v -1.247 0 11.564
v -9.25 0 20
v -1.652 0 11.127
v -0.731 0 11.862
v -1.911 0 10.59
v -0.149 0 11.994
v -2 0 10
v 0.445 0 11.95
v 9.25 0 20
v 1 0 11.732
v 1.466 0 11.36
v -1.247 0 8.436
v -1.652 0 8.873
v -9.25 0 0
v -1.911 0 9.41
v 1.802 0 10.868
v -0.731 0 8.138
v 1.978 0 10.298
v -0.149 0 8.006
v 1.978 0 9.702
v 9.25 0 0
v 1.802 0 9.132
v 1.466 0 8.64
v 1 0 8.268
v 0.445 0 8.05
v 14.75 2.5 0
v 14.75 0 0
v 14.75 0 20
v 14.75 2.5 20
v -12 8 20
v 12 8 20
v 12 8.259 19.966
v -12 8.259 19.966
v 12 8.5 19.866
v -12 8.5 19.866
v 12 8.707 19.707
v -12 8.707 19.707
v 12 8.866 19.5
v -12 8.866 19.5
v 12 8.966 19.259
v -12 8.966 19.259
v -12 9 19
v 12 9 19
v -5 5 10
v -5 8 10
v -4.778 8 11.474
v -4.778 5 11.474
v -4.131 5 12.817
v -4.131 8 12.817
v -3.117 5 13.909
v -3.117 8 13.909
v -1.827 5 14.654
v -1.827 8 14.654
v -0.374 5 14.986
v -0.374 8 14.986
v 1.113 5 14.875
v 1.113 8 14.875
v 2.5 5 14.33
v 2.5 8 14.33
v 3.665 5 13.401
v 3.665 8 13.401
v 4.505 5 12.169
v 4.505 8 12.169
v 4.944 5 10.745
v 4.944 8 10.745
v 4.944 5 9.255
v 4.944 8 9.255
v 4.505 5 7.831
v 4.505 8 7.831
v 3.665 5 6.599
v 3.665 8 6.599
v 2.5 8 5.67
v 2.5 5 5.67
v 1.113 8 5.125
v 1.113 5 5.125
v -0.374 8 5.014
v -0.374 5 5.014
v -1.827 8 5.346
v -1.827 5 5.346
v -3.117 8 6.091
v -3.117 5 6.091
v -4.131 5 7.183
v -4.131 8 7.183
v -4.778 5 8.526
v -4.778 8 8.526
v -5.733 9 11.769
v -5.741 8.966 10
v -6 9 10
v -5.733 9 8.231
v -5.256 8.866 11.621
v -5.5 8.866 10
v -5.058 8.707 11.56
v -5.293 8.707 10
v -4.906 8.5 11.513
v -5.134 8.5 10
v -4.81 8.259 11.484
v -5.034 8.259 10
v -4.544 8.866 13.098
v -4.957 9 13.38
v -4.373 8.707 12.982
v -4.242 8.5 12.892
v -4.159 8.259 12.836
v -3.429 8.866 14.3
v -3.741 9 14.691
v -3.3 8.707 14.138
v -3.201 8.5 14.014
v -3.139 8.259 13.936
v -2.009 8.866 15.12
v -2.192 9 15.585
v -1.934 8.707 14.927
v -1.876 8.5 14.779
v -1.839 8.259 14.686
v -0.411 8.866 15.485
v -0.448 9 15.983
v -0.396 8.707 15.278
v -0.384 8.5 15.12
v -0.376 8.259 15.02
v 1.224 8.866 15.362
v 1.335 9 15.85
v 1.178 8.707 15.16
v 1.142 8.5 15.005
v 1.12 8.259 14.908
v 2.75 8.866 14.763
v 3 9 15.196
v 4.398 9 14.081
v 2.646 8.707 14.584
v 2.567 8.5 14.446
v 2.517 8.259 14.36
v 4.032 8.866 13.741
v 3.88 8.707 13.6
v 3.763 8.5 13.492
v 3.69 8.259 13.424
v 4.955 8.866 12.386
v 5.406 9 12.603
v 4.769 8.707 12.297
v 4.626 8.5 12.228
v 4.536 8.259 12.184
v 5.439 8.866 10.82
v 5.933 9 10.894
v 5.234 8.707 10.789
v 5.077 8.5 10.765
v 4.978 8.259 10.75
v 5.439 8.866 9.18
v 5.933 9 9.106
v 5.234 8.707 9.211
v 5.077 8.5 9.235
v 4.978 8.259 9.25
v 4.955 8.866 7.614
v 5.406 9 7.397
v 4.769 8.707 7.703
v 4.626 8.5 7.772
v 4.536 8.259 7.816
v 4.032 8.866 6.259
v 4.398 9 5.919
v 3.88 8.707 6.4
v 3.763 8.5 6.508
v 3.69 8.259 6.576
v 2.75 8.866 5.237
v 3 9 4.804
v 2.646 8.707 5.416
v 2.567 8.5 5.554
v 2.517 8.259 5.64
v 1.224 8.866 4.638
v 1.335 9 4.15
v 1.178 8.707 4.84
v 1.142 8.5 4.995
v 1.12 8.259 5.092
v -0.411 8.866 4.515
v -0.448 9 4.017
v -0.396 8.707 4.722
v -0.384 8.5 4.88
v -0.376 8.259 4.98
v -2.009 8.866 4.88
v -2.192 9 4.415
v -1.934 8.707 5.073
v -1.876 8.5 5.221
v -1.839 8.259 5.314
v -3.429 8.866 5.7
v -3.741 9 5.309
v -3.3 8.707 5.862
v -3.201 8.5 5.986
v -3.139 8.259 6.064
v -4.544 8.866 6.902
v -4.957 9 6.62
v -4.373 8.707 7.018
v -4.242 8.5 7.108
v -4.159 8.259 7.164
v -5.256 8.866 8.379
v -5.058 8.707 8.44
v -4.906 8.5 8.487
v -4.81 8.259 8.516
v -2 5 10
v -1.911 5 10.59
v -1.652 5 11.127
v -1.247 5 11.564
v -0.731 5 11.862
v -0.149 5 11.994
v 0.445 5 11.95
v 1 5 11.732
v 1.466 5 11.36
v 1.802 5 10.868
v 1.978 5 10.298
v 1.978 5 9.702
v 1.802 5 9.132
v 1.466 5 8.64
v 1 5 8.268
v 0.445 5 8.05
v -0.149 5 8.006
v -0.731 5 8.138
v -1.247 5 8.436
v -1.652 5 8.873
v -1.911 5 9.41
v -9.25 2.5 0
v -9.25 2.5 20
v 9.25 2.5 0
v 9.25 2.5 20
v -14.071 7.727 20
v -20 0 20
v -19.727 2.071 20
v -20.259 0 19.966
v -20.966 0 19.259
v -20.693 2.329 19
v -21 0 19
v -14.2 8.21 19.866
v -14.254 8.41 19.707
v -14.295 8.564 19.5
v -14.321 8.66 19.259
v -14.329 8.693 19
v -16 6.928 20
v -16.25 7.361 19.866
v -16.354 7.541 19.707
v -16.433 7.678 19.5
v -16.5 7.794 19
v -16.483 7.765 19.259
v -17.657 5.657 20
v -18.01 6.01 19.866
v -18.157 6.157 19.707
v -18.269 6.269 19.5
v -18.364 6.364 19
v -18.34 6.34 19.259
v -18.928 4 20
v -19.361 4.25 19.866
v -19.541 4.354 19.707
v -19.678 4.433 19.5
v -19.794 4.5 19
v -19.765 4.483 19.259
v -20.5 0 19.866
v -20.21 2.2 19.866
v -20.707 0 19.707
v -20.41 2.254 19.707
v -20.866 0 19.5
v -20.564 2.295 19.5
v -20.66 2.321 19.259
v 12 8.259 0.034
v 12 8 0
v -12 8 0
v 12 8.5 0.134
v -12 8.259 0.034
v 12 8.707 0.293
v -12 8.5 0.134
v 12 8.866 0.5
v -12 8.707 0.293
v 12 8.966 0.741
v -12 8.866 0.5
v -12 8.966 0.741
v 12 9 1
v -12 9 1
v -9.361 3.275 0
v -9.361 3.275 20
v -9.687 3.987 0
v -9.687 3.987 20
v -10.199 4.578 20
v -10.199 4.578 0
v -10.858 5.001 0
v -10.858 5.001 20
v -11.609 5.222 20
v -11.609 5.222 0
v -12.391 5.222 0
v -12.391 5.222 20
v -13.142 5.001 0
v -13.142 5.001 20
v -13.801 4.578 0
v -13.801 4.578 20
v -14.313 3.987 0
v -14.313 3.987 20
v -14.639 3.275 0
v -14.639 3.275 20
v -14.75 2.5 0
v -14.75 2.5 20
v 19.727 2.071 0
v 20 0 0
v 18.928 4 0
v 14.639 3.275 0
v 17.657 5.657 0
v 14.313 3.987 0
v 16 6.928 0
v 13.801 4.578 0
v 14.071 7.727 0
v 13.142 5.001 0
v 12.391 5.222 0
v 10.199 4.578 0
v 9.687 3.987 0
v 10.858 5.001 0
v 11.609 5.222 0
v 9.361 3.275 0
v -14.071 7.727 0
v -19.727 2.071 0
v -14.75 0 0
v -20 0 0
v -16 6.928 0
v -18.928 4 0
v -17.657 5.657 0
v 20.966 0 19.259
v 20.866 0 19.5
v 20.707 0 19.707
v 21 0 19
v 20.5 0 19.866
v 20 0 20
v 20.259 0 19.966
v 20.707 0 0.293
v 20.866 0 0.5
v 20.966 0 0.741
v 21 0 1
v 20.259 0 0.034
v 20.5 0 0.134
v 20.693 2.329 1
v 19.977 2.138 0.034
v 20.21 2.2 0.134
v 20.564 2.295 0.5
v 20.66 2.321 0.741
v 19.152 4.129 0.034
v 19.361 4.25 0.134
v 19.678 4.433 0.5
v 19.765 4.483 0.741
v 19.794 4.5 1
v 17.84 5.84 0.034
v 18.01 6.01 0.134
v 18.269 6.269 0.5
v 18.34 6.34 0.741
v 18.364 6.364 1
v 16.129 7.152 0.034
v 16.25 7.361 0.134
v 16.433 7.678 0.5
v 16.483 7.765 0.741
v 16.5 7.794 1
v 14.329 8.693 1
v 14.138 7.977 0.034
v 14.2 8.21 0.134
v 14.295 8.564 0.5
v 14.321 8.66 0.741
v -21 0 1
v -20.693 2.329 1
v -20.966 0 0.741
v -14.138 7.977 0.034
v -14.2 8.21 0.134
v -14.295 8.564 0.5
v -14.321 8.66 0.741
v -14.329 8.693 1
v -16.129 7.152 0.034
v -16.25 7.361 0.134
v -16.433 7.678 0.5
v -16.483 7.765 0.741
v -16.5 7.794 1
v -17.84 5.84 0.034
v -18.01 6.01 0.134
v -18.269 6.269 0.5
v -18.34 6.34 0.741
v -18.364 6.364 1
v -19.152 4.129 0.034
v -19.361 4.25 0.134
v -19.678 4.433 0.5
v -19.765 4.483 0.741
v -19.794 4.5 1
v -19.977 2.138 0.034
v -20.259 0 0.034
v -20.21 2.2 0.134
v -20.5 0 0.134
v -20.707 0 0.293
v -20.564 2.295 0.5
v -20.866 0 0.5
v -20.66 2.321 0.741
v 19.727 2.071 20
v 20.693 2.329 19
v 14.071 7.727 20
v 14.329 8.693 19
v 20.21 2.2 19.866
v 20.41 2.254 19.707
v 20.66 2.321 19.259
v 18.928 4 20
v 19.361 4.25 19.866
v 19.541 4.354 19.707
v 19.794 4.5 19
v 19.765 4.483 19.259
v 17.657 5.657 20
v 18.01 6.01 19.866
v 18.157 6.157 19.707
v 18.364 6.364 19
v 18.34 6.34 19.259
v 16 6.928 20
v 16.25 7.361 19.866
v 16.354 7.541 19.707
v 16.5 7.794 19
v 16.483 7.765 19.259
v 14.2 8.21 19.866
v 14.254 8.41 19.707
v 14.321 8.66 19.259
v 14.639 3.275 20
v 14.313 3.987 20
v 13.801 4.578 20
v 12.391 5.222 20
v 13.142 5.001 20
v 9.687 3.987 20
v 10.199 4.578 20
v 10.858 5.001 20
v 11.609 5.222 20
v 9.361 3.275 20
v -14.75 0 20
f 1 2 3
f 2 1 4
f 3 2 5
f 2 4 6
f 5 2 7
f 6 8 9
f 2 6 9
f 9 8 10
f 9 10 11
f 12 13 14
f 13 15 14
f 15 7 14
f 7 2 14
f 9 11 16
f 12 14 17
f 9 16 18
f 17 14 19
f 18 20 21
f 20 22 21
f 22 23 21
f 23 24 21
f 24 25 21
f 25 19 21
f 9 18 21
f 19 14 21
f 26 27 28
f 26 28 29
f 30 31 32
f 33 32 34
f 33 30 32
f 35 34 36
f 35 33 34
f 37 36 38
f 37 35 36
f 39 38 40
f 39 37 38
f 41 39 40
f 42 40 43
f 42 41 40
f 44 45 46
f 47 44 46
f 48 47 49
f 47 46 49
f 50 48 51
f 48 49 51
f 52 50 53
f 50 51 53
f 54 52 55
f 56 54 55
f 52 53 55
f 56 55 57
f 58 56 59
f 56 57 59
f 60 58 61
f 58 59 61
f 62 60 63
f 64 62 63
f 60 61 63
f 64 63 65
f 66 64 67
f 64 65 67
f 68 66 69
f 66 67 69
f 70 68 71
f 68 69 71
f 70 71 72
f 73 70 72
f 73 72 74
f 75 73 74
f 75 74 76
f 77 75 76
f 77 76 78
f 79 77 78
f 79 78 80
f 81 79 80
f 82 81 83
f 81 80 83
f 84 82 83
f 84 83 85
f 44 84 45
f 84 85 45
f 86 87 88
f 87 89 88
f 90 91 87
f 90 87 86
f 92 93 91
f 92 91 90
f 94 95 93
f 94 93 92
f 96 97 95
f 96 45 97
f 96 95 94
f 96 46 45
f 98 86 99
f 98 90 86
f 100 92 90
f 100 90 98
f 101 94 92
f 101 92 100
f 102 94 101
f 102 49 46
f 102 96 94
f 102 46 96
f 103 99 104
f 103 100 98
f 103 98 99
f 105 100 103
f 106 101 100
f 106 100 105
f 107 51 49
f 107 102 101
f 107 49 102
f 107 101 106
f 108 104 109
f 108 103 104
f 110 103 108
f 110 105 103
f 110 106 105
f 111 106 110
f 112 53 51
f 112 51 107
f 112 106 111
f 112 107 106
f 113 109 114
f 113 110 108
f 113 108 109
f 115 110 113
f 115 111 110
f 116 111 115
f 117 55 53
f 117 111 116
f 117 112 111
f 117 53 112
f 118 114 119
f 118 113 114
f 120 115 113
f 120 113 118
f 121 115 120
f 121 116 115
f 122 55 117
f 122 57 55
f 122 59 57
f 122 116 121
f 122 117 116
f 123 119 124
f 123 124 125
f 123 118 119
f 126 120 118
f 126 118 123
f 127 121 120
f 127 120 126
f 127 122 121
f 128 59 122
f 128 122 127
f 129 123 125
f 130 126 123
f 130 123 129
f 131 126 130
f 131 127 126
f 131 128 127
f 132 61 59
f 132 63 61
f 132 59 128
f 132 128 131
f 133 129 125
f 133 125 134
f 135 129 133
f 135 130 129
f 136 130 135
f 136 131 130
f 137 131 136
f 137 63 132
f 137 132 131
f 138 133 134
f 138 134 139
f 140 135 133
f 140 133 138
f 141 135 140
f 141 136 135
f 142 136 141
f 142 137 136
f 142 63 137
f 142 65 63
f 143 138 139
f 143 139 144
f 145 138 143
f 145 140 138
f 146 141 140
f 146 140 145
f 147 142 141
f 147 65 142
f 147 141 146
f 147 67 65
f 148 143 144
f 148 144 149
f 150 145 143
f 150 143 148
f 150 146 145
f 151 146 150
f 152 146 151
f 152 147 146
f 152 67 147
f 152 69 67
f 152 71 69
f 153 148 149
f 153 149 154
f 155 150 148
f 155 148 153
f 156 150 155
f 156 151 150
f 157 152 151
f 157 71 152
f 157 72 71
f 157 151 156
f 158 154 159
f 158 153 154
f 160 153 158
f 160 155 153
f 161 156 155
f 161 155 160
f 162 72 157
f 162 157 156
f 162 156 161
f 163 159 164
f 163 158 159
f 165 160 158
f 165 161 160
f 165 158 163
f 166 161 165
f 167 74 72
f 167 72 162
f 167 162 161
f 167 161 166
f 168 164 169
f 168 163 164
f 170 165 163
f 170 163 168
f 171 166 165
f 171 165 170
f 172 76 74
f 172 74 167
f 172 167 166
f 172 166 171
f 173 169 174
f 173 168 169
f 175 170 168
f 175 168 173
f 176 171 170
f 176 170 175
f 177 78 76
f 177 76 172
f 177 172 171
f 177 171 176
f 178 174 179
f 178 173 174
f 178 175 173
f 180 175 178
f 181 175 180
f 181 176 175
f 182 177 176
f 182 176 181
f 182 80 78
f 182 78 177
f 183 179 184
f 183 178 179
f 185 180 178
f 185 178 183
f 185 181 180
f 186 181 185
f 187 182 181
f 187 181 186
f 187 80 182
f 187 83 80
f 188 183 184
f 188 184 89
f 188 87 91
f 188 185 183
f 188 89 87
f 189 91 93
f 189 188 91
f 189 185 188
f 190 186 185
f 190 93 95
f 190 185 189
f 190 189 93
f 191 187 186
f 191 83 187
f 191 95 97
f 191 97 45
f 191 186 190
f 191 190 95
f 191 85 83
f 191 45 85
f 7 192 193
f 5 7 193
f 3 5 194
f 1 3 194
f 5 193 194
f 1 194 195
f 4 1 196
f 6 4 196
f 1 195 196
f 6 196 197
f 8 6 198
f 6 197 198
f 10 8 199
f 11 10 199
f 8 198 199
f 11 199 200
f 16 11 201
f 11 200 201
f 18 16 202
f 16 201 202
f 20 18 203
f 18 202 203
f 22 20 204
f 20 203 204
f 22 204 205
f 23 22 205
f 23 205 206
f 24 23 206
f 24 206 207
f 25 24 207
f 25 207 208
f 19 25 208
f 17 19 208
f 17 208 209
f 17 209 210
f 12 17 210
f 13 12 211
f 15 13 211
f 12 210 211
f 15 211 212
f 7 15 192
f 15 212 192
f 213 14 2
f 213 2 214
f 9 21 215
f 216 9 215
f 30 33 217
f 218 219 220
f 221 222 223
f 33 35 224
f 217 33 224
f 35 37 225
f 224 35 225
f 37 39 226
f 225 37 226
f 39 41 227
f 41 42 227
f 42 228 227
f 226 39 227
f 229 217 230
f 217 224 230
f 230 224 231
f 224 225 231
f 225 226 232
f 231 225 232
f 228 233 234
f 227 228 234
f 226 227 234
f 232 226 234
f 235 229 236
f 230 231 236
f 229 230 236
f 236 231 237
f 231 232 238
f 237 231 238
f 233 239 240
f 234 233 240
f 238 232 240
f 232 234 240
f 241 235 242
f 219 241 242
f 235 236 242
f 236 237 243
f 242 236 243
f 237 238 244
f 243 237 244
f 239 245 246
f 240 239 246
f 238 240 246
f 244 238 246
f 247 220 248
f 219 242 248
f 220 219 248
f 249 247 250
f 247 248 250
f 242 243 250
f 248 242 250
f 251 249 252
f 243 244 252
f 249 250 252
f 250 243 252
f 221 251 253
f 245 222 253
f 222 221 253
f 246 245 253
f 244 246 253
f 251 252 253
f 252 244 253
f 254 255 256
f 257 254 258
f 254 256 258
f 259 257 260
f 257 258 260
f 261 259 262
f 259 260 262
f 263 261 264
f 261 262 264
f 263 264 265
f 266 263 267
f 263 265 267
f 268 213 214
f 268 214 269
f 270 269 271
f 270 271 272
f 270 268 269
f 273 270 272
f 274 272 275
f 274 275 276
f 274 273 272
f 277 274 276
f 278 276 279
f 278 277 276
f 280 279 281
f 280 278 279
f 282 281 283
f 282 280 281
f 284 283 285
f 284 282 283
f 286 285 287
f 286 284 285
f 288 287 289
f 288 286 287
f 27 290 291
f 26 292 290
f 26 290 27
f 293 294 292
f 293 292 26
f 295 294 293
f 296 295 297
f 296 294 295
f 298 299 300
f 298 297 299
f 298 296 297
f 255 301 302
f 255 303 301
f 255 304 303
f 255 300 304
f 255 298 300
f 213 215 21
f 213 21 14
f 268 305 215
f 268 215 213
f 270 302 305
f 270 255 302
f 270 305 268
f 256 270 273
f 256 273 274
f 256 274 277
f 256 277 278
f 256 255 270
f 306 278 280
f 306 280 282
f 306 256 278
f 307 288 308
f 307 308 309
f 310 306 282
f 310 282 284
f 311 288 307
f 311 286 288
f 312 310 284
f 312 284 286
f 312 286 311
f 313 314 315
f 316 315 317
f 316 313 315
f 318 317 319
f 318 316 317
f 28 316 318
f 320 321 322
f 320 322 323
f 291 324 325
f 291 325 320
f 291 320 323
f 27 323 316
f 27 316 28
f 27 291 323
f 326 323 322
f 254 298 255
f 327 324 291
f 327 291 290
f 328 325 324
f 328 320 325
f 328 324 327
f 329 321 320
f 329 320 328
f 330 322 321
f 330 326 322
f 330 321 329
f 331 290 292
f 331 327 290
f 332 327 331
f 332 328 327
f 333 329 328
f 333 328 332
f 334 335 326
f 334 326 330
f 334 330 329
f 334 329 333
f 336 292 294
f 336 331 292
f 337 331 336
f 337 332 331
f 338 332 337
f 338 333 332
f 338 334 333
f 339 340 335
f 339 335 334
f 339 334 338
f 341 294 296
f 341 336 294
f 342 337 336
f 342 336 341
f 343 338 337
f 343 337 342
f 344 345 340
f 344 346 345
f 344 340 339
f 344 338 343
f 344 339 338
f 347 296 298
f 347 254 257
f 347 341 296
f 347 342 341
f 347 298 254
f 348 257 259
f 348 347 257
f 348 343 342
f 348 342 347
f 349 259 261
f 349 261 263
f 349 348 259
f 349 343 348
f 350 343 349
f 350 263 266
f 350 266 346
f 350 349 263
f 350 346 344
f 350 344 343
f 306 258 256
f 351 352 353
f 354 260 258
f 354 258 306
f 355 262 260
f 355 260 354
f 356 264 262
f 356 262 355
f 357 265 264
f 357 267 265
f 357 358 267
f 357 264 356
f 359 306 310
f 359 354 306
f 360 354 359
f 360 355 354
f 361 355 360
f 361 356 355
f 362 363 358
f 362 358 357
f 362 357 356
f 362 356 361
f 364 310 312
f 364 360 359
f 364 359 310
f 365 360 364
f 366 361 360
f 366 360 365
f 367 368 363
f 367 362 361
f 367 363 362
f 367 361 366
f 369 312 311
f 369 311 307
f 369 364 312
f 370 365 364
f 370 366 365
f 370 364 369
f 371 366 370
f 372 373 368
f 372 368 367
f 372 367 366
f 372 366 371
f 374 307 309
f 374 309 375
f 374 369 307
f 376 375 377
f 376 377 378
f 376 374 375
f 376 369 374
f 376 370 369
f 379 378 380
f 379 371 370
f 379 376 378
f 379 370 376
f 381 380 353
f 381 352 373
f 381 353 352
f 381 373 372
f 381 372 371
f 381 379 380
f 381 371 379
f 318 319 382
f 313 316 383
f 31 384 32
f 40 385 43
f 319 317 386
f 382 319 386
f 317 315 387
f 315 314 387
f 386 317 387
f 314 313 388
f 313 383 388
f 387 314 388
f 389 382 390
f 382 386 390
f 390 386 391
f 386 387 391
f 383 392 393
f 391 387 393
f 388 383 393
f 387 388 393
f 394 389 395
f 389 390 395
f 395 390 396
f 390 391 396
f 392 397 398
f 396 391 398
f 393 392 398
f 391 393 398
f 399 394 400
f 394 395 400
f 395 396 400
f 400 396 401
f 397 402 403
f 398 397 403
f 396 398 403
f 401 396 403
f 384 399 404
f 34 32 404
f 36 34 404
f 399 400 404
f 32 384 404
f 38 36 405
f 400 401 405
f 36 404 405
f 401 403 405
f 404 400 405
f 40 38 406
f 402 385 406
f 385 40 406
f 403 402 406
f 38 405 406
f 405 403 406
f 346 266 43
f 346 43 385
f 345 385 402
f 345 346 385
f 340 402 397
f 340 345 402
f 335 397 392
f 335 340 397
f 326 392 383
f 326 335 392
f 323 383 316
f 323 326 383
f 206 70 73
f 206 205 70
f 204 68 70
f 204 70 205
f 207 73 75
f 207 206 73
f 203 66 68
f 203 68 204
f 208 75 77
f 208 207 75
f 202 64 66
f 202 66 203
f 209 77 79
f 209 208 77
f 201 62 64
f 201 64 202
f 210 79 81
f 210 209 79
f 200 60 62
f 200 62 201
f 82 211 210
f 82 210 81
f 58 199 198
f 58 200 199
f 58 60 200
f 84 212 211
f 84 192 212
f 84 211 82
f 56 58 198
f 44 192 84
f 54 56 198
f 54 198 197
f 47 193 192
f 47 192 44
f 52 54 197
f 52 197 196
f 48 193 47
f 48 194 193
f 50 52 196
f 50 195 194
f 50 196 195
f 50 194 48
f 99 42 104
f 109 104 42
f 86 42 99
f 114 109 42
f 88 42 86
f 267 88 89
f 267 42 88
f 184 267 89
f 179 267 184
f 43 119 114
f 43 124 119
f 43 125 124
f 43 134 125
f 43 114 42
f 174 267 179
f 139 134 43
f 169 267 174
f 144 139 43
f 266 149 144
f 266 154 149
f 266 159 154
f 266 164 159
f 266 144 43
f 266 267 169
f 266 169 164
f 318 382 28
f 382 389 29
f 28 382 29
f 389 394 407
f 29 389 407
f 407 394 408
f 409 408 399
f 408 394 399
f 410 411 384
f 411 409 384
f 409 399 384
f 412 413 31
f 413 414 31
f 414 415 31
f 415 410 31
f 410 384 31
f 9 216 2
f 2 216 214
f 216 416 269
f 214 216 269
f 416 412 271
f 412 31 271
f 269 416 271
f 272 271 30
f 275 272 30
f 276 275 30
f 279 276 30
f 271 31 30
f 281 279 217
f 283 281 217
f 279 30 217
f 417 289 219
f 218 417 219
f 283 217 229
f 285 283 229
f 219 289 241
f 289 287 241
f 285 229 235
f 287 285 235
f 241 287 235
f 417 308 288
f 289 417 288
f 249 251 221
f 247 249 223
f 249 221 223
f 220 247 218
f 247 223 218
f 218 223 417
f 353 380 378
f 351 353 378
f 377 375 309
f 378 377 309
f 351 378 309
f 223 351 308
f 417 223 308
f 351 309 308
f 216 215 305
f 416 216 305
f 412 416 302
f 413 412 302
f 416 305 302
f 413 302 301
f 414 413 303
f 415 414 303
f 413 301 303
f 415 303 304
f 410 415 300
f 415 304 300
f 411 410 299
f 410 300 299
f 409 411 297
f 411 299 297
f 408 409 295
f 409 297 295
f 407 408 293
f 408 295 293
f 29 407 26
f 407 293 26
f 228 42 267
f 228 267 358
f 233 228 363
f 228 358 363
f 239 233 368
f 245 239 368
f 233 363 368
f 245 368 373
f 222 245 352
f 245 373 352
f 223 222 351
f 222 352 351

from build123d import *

# Parameters (mm, degrees)
PAD_DEPTH       = 20
SKETCH001_R     = 5
POCKET_DEPTH    = 4
SKETCH002_R     = 2
POCKET001_DEPTH = 5
FILLET_R        = 1
FILLET001_R     = 1


with BuildPart() as part:
    # Sketch → Pad (new body)
    with BuildSketch(Plane.XY):
        with BuildLine():
            Line((0, 0), (0, 9))
            Line((0, 9), (-12, 9))
            ThreePointArc((-12, 9), (-18.363961, 6.363961), (-21, 0))
            Line((-21, 0), (-14.75, 0))
            Line((-14.75, 0), (-14.75, 2.499989))
            ThreePointArc((-9.25, 2.499989), (-12, 5.25), (-14.75, 2.499989))
            Line((-9.25, 0), (-9.25, 2.499989))
            Line((0, 0), (-9.25, 0))
        make_face()
    extrude(amount=PAD_DEPTH)

    # Mirrored: part across YZ


with BuildPart() as part_1:
    add(part.part)
    add(part.part.mirror(Plane.YZ))

    # Sketch001 (on Face1 of Mirrored) → Pocket (cut)
    with BuildSketch(Plane(origin=(0, 9, 0), x_dir=(-1, 0, 0), z_dir=(0, 1, 0))):
        with Locations((0, 10)):
            Circle(SKETCH001_R)
    extrude(amount=-POCKET_DEPTH, mode=Mode.SUBTRACT)

    # Sketch002 (on Face15 of Pocket) → Pocket001 (cut)
    with BuildSketch(Plane(origin=(0, 5, 0), x_dir=(-1, 0, 0), z_dir=(0, 1, 0))):
        with Locations((0, 10)):
            Circle(SKETCH002_R)
    extrude(amount=-POCKET001_DEPTH, mode=Mode.SUBTRACT)

    # Fillet
    fillet_edges = [part_1.edges().sort_by_distance(p)[0] for p in [
        (-18.363961, 6.363961, 20),
        (-6, 9, 20),
        (6, 9, 20),
        (18.363961, 6.363961, 20),
        (-18.363961, 6.363961, 0),
        (-6, 9, 0),
        (6, 9, 0),
        (18.363961, 6.363961, 0),
    ]]
    fillet(fillet_edges, radius=FILLET_R)

    # Fillet001
    fillet001_edges = [part_1.edges().sort_by_distance(p)[0] for p in [
        (5, 9, 10),
    ]]
    fillet(fillet001_edges, radius=FILLET001_R)


solid = part_1.part
